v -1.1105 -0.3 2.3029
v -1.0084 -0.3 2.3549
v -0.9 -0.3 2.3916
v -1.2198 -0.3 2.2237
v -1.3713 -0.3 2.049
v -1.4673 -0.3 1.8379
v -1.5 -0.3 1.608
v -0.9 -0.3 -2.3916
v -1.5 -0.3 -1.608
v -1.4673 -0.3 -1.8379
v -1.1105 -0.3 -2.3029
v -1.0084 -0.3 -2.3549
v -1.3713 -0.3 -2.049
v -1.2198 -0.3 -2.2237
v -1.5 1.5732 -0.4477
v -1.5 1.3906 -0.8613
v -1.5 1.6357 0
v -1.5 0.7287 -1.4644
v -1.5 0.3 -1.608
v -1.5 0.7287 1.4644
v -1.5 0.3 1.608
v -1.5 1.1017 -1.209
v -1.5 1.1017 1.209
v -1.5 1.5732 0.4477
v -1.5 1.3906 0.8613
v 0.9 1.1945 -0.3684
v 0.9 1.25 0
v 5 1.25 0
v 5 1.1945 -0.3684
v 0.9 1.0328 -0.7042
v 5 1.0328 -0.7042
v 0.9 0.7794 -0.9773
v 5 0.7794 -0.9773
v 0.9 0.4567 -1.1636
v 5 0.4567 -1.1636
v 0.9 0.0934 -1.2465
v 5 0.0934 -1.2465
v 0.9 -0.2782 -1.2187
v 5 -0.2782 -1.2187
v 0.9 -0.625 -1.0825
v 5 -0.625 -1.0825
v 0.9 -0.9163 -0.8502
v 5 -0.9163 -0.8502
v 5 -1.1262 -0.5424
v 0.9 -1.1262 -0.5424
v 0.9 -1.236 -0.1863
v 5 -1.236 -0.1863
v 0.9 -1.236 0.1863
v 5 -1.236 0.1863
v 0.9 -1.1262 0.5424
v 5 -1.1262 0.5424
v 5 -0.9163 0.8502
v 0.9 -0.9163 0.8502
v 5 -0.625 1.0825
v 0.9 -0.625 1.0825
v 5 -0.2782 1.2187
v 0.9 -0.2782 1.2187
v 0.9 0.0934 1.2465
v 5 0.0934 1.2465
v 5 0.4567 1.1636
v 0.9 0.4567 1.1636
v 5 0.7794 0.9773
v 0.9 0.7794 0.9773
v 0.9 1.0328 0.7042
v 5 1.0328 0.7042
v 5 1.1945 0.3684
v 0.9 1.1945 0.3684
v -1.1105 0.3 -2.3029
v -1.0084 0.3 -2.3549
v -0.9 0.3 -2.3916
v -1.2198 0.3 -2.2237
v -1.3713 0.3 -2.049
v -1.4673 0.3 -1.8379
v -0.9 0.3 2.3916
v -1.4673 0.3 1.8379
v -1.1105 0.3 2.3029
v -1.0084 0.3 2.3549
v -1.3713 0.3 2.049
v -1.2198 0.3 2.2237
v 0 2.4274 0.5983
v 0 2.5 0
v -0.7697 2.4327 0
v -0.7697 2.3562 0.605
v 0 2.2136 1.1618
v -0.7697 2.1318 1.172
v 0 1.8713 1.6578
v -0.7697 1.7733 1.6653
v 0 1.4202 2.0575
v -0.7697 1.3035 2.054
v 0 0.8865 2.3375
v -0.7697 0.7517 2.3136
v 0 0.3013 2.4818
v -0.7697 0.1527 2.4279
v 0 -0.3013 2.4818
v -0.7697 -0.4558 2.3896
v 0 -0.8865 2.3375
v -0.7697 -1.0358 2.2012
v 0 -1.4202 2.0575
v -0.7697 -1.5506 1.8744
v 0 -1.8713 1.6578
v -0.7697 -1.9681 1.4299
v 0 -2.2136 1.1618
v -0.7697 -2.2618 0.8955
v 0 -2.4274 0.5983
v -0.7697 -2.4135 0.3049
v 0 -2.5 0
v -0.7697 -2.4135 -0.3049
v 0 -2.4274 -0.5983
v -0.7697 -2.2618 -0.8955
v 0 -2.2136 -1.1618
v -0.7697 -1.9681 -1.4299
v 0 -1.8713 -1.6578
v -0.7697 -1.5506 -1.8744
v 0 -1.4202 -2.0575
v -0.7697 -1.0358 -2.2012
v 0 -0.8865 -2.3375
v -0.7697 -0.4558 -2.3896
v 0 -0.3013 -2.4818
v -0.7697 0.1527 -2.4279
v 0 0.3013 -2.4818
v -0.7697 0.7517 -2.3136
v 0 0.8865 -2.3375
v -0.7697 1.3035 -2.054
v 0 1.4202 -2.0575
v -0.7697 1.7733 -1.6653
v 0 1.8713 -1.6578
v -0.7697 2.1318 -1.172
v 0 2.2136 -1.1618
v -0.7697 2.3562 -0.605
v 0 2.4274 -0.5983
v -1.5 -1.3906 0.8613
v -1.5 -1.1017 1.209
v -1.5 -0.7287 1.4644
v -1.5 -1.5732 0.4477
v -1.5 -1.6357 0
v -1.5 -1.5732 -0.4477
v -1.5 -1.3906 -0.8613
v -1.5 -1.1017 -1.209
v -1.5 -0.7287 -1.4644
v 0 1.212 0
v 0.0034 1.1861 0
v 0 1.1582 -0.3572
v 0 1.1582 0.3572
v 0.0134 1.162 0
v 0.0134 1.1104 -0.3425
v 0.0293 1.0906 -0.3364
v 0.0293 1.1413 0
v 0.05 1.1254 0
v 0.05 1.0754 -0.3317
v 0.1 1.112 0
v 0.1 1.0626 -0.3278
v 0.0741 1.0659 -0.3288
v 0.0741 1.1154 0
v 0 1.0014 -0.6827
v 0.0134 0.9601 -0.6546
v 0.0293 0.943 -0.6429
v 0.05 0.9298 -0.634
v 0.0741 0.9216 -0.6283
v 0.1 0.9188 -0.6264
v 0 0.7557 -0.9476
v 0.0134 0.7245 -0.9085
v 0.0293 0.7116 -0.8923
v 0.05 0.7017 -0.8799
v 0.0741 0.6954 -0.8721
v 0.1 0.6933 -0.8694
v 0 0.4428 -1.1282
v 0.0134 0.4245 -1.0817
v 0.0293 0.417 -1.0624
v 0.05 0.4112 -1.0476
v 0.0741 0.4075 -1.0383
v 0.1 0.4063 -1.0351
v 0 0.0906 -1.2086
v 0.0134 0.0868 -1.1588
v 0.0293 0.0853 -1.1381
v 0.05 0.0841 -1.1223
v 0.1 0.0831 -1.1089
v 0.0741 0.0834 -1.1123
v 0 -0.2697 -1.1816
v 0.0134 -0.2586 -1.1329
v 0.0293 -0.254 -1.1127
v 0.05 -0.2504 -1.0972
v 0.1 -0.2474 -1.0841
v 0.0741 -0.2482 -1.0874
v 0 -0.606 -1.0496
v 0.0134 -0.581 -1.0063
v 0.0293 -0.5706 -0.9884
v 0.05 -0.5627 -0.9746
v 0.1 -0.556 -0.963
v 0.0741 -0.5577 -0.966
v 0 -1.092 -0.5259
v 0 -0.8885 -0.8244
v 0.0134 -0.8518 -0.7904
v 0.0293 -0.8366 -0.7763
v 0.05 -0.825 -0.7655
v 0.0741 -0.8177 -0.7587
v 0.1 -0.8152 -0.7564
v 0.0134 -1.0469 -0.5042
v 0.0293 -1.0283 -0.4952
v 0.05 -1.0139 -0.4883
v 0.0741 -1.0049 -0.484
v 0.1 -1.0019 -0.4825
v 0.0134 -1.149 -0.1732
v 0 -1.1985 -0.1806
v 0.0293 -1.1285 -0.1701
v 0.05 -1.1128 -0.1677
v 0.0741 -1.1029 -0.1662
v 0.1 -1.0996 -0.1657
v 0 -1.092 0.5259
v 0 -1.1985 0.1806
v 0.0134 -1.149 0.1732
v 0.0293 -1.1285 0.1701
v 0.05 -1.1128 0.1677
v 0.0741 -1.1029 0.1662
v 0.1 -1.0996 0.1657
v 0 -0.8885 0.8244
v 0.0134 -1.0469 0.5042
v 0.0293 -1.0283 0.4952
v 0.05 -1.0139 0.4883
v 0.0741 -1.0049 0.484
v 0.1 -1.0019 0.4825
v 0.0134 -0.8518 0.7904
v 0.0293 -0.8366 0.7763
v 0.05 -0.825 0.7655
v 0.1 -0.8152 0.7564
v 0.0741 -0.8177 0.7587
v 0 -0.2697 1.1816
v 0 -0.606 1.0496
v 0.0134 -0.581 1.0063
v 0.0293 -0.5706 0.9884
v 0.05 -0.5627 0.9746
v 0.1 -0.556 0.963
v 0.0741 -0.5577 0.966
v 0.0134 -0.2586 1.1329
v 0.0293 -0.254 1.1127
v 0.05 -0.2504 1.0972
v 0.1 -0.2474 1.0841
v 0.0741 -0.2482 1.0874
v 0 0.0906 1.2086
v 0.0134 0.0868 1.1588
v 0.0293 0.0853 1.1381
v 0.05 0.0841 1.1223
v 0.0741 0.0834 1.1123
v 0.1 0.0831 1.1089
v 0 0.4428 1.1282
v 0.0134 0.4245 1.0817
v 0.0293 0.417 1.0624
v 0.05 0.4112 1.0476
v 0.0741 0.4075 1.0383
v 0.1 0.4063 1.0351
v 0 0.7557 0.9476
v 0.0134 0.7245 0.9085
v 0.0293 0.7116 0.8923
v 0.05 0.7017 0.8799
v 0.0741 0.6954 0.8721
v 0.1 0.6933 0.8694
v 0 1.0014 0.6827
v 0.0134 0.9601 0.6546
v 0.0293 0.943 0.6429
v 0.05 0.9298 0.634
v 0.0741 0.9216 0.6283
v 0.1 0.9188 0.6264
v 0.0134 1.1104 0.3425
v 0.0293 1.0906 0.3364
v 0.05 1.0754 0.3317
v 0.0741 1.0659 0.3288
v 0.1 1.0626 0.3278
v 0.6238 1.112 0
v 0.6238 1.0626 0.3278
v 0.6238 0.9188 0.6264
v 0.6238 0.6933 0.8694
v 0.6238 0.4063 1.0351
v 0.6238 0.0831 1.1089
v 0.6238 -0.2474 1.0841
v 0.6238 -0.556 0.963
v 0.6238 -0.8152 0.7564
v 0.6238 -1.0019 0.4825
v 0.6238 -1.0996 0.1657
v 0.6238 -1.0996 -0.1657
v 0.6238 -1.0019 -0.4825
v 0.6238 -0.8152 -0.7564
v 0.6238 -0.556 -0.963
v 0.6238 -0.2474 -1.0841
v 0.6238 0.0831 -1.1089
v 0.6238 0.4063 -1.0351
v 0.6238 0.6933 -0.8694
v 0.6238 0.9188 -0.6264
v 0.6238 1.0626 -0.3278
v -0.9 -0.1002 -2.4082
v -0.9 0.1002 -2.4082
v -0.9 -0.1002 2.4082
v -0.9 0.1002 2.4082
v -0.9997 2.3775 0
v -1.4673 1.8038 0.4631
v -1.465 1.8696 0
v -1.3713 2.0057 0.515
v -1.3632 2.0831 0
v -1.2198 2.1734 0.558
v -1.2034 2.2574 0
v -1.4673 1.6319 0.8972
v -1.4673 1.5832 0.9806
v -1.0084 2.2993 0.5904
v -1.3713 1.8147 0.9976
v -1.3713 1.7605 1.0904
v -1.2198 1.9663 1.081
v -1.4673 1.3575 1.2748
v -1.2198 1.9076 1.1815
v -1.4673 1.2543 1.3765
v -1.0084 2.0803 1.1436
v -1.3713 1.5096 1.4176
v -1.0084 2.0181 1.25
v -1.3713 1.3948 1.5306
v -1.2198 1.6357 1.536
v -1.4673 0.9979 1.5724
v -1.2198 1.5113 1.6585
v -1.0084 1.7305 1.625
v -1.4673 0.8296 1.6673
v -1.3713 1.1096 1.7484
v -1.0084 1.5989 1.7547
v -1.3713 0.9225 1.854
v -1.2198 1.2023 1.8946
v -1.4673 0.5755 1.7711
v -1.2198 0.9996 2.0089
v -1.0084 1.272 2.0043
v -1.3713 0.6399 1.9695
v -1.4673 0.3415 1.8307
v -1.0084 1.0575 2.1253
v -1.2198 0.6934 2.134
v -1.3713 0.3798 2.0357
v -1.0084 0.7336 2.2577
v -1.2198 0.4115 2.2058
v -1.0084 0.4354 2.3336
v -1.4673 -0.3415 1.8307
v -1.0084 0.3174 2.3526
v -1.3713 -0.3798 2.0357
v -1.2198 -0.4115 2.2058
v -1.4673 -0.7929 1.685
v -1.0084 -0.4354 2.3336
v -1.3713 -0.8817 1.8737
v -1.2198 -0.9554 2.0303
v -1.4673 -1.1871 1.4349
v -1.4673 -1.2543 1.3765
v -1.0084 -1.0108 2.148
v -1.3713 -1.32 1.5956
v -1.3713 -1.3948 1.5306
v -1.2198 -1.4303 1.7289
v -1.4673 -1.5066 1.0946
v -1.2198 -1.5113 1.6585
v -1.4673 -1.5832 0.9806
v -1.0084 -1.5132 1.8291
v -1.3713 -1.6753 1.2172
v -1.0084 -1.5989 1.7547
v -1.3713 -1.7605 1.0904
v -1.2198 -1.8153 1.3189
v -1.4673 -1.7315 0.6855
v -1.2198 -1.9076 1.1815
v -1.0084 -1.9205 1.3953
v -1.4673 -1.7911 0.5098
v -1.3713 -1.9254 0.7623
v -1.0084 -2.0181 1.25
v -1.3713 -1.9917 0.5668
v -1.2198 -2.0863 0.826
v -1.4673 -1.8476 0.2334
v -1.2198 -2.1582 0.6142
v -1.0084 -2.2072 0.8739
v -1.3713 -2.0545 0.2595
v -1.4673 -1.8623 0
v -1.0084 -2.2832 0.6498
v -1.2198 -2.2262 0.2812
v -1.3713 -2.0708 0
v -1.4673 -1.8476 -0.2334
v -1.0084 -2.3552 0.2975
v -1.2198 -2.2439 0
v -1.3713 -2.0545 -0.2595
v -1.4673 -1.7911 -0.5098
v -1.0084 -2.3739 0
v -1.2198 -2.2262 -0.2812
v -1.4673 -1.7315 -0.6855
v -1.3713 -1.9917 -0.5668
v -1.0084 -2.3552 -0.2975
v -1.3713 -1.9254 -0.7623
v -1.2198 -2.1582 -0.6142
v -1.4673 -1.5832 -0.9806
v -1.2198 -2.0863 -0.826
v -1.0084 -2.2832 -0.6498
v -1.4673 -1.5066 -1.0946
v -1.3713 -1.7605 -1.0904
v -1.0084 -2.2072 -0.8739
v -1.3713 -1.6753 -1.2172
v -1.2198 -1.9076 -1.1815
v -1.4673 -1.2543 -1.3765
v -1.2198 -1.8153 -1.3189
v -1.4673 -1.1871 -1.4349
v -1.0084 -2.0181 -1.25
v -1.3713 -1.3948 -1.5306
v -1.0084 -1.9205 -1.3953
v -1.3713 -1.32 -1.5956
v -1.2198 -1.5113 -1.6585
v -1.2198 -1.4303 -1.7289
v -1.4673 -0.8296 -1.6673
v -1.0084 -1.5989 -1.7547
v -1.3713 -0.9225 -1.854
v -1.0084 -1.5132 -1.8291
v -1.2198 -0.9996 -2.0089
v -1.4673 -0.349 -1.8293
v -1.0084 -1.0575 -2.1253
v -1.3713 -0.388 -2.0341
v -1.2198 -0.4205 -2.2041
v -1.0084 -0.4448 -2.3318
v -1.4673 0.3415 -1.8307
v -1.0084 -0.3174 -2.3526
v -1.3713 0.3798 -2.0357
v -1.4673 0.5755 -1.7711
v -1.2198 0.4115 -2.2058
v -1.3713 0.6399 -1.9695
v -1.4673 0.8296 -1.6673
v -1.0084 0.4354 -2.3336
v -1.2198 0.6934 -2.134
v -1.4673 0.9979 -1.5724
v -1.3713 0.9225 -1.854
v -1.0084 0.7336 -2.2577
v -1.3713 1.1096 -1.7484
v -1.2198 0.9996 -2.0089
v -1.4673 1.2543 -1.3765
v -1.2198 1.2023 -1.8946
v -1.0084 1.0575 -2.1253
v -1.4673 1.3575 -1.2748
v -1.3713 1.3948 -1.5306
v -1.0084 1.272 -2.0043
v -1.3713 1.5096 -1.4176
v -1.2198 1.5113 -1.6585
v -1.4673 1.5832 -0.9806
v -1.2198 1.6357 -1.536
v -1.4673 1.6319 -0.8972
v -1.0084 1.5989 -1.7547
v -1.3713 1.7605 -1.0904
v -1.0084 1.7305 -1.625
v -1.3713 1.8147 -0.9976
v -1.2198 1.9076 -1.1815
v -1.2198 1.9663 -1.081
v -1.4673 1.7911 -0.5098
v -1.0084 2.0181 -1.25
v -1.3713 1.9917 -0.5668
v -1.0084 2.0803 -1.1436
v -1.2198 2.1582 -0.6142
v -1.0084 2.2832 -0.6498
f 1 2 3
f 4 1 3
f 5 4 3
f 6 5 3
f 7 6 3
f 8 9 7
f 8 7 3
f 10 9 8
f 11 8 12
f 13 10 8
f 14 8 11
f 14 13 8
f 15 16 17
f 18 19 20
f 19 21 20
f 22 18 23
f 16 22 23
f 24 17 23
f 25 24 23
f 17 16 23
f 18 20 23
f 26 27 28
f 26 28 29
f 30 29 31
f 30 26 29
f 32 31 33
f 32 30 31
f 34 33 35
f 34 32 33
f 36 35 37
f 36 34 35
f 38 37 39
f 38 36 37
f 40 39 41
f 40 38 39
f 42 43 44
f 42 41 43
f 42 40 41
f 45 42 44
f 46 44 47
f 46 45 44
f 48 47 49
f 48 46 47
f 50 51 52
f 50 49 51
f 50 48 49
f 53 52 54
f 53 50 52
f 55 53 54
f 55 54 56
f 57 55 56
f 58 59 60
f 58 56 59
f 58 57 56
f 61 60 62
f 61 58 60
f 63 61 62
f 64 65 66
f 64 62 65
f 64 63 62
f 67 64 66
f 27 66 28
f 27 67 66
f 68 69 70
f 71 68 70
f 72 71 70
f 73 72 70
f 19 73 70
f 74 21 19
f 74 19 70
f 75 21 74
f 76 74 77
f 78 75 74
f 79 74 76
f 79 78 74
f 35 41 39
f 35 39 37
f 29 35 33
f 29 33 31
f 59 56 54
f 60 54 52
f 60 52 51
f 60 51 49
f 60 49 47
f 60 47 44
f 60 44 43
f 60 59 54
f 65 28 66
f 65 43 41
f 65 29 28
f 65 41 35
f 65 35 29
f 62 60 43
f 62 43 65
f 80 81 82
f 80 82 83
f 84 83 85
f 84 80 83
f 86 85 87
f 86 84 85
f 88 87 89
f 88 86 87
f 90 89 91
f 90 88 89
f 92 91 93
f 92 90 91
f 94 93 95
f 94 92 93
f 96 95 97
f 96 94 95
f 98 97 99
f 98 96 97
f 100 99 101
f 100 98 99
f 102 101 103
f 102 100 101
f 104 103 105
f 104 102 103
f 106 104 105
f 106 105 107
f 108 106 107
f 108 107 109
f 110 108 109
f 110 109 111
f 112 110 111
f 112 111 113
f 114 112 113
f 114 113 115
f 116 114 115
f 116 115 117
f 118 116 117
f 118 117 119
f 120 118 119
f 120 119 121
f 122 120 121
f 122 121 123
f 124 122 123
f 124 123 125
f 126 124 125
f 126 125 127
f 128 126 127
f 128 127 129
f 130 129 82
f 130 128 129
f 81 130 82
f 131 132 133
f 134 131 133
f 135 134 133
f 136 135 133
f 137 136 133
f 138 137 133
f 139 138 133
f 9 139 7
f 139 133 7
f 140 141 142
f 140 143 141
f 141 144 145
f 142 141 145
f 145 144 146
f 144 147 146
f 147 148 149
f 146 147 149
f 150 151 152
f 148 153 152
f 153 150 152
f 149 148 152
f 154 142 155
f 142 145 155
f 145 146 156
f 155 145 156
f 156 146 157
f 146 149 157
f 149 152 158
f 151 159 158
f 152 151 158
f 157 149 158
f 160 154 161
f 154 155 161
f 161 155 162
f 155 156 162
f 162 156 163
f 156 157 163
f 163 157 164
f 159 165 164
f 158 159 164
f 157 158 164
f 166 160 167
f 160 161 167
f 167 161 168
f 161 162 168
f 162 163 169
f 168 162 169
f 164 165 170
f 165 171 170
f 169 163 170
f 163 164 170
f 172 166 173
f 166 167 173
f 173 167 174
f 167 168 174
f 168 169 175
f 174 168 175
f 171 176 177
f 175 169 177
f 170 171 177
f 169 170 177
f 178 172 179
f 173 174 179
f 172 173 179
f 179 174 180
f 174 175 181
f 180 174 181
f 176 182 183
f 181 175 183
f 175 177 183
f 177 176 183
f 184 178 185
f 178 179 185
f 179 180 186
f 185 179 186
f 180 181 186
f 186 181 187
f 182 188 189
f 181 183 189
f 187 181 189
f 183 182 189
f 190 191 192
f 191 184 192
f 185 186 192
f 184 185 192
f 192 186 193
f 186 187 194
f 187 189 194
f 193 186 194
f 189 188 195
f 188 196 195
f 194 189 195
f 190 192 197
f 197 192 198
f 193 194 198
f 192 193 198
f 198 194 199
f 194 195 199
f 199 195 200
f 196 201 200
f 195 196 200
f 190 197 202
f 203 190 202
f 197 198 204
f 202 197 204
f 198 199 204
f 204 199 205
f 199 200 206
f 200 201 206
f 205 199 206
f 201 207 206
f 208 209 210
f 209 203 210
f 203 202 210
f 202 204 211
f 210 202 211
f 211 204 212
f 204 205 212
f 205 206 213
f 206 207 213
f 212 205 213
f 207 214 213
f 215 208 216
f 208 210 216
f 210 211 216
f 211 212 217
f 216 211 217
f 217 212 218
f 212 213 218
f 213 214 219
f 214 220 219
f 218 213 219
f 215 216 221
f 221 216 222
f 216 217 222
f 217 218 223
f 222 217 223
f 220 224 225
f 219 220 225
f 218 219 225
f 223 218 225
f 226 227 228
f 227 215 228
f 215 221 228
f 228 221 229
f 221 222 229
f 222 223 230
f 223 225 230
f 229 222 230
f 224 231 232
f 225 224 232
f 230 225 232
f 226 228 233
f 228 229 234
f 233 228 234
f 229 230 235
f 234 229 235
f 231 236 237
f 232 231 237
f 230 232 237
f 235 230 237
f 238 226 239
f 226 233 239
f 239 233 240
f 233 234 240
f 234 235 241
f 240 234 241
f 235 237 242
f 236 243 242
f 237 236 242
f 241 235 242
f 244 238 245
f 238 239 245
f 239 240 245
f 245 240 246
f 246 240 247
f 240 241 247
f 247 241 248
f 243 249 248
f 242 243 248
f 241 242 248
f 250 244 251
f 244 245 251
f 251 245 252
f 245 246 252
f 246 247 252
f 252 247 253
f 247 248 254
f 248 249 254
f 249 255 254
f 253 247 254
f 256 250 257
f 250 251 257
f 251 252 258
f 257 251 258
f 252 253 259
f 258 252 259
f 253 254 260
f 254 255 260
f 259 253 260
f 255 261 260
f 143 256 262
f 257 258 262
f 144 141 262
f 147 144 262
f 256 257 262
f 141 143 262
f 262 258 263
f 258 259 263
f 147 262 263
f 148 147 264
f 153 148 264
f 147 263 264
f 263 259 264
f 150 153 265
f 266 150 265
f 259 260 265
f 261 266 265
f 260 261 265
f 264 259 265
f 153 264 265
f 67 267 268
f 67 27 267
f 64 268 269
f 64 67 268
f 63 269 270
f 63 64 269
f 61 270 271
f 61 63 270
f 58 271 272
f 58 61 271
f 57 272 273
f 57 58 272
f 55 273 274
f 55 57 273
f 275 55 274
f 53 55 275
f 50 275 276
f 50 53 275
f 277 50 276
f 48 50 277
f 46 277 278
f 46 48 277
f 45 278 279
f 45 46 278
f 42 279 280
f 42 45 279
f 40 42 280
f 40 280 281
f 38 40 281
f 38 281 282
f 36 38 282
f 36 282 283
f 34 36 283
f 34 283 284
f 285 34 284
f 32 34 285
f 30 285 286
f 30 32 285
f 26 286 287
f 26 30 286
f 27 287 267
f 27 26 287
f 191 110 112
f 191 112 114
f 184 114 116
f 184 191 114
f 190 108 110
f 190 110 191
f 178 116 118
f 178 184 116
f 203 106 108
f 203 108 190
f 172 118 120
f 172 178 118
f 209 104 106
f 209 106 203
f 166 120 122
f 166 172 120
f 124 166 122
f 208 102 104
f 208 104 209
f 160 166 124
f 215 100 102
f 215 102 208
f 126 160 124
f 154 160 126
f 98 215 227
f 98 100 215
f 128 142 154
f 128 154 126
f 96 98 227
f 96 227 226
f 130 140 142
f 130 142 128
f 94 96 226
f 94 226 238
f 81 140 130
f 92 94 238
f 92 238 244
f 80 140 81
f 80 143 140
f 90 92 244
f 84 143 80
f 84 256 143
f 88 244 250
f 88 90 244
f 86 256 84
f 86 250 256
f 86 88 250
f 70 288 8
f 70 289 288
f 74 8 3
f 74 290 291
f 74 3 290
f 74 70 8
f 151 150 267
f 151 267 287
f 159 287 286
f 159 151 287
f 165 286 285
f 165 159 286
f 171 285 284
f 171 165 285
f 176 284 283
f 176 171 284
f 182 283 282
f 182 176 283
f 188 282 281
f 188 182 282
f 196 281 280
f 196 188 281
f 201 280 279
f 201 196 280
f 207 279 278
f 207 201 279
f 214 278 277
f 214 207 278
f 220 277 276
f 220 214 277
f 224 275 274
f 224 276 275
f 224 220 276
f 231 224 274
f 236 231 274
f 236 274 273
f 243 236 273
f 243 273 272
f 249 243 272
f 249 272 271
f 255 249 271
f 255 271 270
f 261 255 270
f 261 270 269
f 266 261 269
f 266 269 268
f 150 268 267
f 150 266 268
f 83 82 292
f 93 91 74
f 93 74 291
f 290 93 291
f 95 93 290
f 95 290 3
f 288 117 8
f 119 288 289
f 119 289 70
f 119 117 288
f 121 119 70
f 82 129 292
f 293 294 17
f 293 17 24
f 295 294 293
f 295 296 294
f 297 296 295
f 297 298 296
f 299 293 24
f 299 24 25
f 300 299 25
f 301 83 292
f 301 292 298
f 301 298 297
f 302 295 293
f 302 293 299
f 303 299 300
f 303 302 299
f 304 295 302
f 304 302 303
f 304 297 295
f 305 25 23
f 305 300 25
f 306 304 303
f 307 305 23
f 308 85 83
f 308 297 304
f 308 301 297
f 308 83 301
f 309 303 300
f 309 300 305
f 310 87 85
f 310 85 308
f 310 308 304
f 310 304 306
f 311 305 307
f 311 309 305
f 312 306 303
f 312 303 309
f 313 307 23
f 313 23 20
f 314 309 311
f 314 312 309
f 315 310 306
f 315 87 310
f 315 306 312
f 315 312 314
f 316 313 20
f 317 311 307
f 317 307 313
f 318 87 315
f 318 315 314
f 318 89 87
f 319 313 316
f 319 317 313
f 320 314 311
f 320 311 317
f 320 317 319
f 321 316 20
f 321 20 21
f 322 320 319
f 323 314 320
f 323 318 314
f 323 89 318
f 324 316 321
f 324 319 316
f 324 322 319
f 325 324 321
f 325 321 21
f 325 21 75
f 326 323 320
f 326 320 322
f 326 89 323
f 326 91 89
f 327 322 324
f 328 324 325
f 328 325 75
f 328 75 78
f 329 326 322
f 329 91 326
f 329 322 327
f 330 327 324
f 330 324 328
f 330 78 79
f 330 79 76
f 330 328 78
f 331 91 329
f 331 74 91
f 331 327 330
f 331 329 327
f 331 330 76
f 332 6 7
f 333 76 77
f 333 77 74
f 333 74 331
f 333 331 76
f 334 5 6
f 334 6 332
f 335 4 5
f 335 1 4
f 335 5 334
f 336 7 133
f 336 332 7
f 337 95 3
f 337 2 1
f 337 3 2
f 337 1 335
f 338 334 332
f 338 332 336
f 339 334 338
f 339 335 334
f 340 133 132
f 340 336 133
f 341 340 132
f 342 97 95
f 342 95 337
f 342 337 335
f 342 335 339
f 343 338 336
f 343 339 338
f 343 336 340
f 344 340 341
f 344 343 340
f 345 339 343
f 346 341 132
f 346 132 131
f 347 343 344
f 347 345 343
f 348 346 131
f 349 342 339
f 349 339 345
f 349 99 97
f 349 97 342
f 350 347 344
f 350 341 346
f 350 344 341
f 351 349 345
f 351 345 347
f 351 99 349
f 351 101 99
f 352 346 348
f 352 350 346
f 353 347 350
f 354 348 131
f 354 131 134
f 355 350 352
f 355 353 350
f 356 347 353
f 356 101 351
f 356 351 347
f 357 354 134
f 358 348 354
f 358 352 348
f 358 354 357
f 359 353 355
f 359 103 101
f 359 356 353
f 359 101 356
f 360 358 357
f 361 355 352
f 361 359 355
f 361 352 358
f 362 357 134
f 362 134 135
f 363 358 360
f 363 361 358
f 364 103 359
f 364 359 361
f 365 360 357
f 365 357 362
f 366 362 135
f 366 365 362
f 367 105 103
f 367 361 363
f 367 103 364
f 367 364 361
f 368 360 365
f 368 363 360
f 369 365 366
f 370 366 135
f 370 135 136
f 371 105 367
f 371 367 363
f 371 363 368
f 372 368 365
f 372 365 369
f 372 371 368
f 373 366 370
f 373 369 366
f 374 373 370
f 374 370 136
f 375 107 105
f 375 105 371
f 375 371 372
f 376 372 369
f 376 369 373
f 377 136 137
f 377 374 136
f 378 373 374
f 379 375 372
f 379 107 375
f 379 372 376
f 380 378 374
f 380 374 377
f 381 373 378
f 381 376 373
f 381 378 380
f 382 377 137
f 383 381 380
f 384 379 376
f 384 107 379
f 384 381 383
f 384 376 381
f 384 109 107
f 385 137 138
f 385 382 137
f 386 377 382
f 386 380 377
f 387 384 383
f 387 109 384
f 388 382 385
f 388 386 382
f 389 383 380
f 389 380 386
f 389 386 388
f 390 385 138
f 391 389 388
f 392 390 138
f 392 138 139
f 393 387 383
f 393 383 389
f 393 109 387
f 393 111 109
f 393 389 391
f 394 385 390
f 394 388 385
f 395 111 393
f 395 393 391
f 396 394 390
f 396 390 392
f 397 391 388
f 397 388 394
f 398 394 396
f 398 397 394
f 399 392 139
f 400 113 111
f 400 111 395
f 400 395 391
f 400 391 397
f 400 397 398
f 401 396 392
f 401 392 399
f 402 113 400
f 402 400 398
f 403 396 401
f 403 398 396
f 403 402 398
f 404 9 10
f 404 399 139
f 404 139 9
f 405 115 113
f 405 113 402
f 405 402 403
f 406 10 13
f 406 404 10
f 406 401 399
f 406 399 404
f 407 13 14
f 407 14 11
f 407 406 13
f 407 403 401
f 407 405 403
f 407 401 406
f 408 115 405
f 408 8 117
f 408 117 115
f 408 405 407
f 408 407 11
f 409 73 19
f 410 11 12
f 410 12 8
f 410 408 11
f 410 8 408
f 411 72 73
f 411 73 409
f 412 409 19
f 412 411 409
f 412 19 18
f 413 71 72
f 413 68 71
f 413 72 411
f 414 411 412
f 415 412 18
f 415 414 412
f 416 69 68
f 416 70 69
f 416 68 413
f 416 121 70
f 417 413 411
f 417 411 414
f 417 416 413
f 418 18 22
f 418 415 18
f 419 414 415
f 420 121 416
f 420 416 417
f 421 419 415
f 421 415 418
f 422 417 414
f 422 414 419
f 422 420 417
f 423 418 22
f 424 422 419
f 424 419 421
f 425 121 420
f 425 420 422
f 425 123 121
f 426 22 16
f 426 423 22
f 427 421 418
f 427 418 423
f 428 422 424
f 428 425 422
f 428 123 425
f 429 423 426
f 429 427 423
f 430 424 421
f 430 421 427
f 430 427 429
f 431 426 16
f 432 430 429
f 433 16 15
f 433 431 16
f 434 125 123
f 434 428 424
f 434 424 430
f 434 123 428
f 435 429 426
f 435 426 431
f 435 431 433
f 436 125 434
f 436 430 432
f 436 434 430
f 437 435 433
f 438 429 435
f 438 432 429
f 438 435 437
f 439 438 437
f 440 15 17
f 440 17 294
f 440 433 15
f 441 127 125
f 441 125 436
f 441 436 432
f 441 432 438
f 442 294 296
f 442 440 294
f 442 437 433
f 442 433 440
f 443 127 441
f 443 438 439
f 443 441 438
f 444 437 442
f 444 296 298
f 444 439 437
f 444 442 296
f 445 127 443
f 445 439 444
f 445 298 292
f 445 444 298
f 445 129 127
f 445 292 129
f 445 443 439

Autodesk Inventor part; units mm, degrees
ref_plane "YZ Plane" through (0, 0, 0) normal (1, 0, 0) x (0, 1, 0)
ref_plane "XZ Plane" through (0, 0, 0) normal (0, 1, 0) x (-1, 0, 0)
sketch "Skizze1" plane through (0, 0, 0) normal (0, 0, 1) x (1, 0, 0)
  line L0 (-1.5, 0) -> (5, 0)
  line L1 (5, 0) -> (5, 1.25)
  line L2 (5, 1.25) -> (0.9, 1.25)
  line L3 (0.9, 1.25) -> (0.6238, 1.112)
  line L4 (0.6238, 1.112) -> (0, 1.112)
  line L5 (0, 1.112) -> (0, 2.5)
  line L6 (-2.8, 0) -> (6.3, 0) projected
  line L7 (0, -0.5) -> (0, 3) projected
  line L8 (-1.5, 0) -> (-1.5, 2.3688)
  line L9 (0, 2.5) -> (-1.5, 2.3688)
  line L10 (0.9, 1.25) -> (0, 1.25) construction
  dimension "d0" = 5
  dimension "d1" = 4.1
  dimension "d2" = 0.2762
  dimension "d3" = 1.5
  dimension "d4" = 2.5
  dimension "d5" = 2.224
  dimension "d9" = 5
  dimension "d10" = 5
revolve "Körper" add sketch "Skizze1" angle 360 about axis through (-1.5, 0, 0) along (1, 0, 0)
sketch "Skizze2" plane through (-1.5, 0, 0) normal (-1, 0, 0) x (0, 0, 1)
  circle A0 centre (0, 0) radius 2.5 projected
  line L0 (0, 0) -> (0, 2.3688) projected
  line L1 (-2.5, 0.3) -> (2.5, 0.3)
  line L2 (2.5, 0.3) -> (2.5, -0.3)
  line L3 (2.5, -0.3) -> (-2.5, -0.3)
  line L4 (-2.5, -0.3) -> (-2.5, 0.3)
  line L5 (-2.5, 0) -> (2.5, 0) construction
  line L6 (0, 0.3) -> (0, -0.3) construction
  dimension "d11" = 0.6
  dimension "d12" = 5
fillet "Rundung1" radius 0.8 1 edges at (-1.5, -2.3688, 0)
extrude "Loch" cut sketch "Skizze2" against normal blind 0.6 contours A0 L3 L1 | L2 L3 A0 | A0 L1 L2 | A0 L4 L1 | L3 L4 A0
thread "Gewinde" size "M2.5x0.45" class "6g" standard "ISO Metric profile" length 4.1
ref_plane "Work Plane1" through (30.1625, 0, 0) normal (0, 0, -1) x (1, 0, 0)
fillet "Fillet5" radius 0.1 1 edges at (0, -1.112, 0)
equation "\"d11\" = SBR"
equation "\"d12\" = KOD"
equation "\"d14\" = RR"
equation "\"d19\" = STI"
equation "\"d15\" = GEL"
equation "\"d41\" = R"
equation "\"d0\" = NLG"
equation "\"d1\" = GEL"
equation "\"d3\" = KOH"
equation "\"d4\" = GD"
equation "\"d5\" = BDM"
equation "\"d9\" = KOD"
equation "\"d10\" = KEWI"
equation "\"GD\" = NND"
equation "\"NLG\" = 5"
equation "\"GEL\" = 4.1"
equation "\"KOD\" = 5"
equation "\"KOH\" = 1.5"
equation "\"GAL\" = 0.61345 * PTC"
equation "\"R\" = 0.1"
equation "\"BDM\" = 2.224"
equation "\"GUL\" = 0.61345 * PTC"
equation "\"RR\" = 0.8"
equation "\"SBR\" = 0.6"
equation "\"STI\" = 0.6"
equation "\"KEWI\" = 5deg"
equation "\"PTC\" = 0.45"
equation "\"THREADDIA\" = 2.5"
equation "\"TOA\" = 30deg"
equation "\"NND\" = 2.5"
equation "\"GD1\" = THREADDIA - 1.2269 * PTC"
properties part number "ISO 1580 - M2,5 x 5" material "Stahl, weich"
